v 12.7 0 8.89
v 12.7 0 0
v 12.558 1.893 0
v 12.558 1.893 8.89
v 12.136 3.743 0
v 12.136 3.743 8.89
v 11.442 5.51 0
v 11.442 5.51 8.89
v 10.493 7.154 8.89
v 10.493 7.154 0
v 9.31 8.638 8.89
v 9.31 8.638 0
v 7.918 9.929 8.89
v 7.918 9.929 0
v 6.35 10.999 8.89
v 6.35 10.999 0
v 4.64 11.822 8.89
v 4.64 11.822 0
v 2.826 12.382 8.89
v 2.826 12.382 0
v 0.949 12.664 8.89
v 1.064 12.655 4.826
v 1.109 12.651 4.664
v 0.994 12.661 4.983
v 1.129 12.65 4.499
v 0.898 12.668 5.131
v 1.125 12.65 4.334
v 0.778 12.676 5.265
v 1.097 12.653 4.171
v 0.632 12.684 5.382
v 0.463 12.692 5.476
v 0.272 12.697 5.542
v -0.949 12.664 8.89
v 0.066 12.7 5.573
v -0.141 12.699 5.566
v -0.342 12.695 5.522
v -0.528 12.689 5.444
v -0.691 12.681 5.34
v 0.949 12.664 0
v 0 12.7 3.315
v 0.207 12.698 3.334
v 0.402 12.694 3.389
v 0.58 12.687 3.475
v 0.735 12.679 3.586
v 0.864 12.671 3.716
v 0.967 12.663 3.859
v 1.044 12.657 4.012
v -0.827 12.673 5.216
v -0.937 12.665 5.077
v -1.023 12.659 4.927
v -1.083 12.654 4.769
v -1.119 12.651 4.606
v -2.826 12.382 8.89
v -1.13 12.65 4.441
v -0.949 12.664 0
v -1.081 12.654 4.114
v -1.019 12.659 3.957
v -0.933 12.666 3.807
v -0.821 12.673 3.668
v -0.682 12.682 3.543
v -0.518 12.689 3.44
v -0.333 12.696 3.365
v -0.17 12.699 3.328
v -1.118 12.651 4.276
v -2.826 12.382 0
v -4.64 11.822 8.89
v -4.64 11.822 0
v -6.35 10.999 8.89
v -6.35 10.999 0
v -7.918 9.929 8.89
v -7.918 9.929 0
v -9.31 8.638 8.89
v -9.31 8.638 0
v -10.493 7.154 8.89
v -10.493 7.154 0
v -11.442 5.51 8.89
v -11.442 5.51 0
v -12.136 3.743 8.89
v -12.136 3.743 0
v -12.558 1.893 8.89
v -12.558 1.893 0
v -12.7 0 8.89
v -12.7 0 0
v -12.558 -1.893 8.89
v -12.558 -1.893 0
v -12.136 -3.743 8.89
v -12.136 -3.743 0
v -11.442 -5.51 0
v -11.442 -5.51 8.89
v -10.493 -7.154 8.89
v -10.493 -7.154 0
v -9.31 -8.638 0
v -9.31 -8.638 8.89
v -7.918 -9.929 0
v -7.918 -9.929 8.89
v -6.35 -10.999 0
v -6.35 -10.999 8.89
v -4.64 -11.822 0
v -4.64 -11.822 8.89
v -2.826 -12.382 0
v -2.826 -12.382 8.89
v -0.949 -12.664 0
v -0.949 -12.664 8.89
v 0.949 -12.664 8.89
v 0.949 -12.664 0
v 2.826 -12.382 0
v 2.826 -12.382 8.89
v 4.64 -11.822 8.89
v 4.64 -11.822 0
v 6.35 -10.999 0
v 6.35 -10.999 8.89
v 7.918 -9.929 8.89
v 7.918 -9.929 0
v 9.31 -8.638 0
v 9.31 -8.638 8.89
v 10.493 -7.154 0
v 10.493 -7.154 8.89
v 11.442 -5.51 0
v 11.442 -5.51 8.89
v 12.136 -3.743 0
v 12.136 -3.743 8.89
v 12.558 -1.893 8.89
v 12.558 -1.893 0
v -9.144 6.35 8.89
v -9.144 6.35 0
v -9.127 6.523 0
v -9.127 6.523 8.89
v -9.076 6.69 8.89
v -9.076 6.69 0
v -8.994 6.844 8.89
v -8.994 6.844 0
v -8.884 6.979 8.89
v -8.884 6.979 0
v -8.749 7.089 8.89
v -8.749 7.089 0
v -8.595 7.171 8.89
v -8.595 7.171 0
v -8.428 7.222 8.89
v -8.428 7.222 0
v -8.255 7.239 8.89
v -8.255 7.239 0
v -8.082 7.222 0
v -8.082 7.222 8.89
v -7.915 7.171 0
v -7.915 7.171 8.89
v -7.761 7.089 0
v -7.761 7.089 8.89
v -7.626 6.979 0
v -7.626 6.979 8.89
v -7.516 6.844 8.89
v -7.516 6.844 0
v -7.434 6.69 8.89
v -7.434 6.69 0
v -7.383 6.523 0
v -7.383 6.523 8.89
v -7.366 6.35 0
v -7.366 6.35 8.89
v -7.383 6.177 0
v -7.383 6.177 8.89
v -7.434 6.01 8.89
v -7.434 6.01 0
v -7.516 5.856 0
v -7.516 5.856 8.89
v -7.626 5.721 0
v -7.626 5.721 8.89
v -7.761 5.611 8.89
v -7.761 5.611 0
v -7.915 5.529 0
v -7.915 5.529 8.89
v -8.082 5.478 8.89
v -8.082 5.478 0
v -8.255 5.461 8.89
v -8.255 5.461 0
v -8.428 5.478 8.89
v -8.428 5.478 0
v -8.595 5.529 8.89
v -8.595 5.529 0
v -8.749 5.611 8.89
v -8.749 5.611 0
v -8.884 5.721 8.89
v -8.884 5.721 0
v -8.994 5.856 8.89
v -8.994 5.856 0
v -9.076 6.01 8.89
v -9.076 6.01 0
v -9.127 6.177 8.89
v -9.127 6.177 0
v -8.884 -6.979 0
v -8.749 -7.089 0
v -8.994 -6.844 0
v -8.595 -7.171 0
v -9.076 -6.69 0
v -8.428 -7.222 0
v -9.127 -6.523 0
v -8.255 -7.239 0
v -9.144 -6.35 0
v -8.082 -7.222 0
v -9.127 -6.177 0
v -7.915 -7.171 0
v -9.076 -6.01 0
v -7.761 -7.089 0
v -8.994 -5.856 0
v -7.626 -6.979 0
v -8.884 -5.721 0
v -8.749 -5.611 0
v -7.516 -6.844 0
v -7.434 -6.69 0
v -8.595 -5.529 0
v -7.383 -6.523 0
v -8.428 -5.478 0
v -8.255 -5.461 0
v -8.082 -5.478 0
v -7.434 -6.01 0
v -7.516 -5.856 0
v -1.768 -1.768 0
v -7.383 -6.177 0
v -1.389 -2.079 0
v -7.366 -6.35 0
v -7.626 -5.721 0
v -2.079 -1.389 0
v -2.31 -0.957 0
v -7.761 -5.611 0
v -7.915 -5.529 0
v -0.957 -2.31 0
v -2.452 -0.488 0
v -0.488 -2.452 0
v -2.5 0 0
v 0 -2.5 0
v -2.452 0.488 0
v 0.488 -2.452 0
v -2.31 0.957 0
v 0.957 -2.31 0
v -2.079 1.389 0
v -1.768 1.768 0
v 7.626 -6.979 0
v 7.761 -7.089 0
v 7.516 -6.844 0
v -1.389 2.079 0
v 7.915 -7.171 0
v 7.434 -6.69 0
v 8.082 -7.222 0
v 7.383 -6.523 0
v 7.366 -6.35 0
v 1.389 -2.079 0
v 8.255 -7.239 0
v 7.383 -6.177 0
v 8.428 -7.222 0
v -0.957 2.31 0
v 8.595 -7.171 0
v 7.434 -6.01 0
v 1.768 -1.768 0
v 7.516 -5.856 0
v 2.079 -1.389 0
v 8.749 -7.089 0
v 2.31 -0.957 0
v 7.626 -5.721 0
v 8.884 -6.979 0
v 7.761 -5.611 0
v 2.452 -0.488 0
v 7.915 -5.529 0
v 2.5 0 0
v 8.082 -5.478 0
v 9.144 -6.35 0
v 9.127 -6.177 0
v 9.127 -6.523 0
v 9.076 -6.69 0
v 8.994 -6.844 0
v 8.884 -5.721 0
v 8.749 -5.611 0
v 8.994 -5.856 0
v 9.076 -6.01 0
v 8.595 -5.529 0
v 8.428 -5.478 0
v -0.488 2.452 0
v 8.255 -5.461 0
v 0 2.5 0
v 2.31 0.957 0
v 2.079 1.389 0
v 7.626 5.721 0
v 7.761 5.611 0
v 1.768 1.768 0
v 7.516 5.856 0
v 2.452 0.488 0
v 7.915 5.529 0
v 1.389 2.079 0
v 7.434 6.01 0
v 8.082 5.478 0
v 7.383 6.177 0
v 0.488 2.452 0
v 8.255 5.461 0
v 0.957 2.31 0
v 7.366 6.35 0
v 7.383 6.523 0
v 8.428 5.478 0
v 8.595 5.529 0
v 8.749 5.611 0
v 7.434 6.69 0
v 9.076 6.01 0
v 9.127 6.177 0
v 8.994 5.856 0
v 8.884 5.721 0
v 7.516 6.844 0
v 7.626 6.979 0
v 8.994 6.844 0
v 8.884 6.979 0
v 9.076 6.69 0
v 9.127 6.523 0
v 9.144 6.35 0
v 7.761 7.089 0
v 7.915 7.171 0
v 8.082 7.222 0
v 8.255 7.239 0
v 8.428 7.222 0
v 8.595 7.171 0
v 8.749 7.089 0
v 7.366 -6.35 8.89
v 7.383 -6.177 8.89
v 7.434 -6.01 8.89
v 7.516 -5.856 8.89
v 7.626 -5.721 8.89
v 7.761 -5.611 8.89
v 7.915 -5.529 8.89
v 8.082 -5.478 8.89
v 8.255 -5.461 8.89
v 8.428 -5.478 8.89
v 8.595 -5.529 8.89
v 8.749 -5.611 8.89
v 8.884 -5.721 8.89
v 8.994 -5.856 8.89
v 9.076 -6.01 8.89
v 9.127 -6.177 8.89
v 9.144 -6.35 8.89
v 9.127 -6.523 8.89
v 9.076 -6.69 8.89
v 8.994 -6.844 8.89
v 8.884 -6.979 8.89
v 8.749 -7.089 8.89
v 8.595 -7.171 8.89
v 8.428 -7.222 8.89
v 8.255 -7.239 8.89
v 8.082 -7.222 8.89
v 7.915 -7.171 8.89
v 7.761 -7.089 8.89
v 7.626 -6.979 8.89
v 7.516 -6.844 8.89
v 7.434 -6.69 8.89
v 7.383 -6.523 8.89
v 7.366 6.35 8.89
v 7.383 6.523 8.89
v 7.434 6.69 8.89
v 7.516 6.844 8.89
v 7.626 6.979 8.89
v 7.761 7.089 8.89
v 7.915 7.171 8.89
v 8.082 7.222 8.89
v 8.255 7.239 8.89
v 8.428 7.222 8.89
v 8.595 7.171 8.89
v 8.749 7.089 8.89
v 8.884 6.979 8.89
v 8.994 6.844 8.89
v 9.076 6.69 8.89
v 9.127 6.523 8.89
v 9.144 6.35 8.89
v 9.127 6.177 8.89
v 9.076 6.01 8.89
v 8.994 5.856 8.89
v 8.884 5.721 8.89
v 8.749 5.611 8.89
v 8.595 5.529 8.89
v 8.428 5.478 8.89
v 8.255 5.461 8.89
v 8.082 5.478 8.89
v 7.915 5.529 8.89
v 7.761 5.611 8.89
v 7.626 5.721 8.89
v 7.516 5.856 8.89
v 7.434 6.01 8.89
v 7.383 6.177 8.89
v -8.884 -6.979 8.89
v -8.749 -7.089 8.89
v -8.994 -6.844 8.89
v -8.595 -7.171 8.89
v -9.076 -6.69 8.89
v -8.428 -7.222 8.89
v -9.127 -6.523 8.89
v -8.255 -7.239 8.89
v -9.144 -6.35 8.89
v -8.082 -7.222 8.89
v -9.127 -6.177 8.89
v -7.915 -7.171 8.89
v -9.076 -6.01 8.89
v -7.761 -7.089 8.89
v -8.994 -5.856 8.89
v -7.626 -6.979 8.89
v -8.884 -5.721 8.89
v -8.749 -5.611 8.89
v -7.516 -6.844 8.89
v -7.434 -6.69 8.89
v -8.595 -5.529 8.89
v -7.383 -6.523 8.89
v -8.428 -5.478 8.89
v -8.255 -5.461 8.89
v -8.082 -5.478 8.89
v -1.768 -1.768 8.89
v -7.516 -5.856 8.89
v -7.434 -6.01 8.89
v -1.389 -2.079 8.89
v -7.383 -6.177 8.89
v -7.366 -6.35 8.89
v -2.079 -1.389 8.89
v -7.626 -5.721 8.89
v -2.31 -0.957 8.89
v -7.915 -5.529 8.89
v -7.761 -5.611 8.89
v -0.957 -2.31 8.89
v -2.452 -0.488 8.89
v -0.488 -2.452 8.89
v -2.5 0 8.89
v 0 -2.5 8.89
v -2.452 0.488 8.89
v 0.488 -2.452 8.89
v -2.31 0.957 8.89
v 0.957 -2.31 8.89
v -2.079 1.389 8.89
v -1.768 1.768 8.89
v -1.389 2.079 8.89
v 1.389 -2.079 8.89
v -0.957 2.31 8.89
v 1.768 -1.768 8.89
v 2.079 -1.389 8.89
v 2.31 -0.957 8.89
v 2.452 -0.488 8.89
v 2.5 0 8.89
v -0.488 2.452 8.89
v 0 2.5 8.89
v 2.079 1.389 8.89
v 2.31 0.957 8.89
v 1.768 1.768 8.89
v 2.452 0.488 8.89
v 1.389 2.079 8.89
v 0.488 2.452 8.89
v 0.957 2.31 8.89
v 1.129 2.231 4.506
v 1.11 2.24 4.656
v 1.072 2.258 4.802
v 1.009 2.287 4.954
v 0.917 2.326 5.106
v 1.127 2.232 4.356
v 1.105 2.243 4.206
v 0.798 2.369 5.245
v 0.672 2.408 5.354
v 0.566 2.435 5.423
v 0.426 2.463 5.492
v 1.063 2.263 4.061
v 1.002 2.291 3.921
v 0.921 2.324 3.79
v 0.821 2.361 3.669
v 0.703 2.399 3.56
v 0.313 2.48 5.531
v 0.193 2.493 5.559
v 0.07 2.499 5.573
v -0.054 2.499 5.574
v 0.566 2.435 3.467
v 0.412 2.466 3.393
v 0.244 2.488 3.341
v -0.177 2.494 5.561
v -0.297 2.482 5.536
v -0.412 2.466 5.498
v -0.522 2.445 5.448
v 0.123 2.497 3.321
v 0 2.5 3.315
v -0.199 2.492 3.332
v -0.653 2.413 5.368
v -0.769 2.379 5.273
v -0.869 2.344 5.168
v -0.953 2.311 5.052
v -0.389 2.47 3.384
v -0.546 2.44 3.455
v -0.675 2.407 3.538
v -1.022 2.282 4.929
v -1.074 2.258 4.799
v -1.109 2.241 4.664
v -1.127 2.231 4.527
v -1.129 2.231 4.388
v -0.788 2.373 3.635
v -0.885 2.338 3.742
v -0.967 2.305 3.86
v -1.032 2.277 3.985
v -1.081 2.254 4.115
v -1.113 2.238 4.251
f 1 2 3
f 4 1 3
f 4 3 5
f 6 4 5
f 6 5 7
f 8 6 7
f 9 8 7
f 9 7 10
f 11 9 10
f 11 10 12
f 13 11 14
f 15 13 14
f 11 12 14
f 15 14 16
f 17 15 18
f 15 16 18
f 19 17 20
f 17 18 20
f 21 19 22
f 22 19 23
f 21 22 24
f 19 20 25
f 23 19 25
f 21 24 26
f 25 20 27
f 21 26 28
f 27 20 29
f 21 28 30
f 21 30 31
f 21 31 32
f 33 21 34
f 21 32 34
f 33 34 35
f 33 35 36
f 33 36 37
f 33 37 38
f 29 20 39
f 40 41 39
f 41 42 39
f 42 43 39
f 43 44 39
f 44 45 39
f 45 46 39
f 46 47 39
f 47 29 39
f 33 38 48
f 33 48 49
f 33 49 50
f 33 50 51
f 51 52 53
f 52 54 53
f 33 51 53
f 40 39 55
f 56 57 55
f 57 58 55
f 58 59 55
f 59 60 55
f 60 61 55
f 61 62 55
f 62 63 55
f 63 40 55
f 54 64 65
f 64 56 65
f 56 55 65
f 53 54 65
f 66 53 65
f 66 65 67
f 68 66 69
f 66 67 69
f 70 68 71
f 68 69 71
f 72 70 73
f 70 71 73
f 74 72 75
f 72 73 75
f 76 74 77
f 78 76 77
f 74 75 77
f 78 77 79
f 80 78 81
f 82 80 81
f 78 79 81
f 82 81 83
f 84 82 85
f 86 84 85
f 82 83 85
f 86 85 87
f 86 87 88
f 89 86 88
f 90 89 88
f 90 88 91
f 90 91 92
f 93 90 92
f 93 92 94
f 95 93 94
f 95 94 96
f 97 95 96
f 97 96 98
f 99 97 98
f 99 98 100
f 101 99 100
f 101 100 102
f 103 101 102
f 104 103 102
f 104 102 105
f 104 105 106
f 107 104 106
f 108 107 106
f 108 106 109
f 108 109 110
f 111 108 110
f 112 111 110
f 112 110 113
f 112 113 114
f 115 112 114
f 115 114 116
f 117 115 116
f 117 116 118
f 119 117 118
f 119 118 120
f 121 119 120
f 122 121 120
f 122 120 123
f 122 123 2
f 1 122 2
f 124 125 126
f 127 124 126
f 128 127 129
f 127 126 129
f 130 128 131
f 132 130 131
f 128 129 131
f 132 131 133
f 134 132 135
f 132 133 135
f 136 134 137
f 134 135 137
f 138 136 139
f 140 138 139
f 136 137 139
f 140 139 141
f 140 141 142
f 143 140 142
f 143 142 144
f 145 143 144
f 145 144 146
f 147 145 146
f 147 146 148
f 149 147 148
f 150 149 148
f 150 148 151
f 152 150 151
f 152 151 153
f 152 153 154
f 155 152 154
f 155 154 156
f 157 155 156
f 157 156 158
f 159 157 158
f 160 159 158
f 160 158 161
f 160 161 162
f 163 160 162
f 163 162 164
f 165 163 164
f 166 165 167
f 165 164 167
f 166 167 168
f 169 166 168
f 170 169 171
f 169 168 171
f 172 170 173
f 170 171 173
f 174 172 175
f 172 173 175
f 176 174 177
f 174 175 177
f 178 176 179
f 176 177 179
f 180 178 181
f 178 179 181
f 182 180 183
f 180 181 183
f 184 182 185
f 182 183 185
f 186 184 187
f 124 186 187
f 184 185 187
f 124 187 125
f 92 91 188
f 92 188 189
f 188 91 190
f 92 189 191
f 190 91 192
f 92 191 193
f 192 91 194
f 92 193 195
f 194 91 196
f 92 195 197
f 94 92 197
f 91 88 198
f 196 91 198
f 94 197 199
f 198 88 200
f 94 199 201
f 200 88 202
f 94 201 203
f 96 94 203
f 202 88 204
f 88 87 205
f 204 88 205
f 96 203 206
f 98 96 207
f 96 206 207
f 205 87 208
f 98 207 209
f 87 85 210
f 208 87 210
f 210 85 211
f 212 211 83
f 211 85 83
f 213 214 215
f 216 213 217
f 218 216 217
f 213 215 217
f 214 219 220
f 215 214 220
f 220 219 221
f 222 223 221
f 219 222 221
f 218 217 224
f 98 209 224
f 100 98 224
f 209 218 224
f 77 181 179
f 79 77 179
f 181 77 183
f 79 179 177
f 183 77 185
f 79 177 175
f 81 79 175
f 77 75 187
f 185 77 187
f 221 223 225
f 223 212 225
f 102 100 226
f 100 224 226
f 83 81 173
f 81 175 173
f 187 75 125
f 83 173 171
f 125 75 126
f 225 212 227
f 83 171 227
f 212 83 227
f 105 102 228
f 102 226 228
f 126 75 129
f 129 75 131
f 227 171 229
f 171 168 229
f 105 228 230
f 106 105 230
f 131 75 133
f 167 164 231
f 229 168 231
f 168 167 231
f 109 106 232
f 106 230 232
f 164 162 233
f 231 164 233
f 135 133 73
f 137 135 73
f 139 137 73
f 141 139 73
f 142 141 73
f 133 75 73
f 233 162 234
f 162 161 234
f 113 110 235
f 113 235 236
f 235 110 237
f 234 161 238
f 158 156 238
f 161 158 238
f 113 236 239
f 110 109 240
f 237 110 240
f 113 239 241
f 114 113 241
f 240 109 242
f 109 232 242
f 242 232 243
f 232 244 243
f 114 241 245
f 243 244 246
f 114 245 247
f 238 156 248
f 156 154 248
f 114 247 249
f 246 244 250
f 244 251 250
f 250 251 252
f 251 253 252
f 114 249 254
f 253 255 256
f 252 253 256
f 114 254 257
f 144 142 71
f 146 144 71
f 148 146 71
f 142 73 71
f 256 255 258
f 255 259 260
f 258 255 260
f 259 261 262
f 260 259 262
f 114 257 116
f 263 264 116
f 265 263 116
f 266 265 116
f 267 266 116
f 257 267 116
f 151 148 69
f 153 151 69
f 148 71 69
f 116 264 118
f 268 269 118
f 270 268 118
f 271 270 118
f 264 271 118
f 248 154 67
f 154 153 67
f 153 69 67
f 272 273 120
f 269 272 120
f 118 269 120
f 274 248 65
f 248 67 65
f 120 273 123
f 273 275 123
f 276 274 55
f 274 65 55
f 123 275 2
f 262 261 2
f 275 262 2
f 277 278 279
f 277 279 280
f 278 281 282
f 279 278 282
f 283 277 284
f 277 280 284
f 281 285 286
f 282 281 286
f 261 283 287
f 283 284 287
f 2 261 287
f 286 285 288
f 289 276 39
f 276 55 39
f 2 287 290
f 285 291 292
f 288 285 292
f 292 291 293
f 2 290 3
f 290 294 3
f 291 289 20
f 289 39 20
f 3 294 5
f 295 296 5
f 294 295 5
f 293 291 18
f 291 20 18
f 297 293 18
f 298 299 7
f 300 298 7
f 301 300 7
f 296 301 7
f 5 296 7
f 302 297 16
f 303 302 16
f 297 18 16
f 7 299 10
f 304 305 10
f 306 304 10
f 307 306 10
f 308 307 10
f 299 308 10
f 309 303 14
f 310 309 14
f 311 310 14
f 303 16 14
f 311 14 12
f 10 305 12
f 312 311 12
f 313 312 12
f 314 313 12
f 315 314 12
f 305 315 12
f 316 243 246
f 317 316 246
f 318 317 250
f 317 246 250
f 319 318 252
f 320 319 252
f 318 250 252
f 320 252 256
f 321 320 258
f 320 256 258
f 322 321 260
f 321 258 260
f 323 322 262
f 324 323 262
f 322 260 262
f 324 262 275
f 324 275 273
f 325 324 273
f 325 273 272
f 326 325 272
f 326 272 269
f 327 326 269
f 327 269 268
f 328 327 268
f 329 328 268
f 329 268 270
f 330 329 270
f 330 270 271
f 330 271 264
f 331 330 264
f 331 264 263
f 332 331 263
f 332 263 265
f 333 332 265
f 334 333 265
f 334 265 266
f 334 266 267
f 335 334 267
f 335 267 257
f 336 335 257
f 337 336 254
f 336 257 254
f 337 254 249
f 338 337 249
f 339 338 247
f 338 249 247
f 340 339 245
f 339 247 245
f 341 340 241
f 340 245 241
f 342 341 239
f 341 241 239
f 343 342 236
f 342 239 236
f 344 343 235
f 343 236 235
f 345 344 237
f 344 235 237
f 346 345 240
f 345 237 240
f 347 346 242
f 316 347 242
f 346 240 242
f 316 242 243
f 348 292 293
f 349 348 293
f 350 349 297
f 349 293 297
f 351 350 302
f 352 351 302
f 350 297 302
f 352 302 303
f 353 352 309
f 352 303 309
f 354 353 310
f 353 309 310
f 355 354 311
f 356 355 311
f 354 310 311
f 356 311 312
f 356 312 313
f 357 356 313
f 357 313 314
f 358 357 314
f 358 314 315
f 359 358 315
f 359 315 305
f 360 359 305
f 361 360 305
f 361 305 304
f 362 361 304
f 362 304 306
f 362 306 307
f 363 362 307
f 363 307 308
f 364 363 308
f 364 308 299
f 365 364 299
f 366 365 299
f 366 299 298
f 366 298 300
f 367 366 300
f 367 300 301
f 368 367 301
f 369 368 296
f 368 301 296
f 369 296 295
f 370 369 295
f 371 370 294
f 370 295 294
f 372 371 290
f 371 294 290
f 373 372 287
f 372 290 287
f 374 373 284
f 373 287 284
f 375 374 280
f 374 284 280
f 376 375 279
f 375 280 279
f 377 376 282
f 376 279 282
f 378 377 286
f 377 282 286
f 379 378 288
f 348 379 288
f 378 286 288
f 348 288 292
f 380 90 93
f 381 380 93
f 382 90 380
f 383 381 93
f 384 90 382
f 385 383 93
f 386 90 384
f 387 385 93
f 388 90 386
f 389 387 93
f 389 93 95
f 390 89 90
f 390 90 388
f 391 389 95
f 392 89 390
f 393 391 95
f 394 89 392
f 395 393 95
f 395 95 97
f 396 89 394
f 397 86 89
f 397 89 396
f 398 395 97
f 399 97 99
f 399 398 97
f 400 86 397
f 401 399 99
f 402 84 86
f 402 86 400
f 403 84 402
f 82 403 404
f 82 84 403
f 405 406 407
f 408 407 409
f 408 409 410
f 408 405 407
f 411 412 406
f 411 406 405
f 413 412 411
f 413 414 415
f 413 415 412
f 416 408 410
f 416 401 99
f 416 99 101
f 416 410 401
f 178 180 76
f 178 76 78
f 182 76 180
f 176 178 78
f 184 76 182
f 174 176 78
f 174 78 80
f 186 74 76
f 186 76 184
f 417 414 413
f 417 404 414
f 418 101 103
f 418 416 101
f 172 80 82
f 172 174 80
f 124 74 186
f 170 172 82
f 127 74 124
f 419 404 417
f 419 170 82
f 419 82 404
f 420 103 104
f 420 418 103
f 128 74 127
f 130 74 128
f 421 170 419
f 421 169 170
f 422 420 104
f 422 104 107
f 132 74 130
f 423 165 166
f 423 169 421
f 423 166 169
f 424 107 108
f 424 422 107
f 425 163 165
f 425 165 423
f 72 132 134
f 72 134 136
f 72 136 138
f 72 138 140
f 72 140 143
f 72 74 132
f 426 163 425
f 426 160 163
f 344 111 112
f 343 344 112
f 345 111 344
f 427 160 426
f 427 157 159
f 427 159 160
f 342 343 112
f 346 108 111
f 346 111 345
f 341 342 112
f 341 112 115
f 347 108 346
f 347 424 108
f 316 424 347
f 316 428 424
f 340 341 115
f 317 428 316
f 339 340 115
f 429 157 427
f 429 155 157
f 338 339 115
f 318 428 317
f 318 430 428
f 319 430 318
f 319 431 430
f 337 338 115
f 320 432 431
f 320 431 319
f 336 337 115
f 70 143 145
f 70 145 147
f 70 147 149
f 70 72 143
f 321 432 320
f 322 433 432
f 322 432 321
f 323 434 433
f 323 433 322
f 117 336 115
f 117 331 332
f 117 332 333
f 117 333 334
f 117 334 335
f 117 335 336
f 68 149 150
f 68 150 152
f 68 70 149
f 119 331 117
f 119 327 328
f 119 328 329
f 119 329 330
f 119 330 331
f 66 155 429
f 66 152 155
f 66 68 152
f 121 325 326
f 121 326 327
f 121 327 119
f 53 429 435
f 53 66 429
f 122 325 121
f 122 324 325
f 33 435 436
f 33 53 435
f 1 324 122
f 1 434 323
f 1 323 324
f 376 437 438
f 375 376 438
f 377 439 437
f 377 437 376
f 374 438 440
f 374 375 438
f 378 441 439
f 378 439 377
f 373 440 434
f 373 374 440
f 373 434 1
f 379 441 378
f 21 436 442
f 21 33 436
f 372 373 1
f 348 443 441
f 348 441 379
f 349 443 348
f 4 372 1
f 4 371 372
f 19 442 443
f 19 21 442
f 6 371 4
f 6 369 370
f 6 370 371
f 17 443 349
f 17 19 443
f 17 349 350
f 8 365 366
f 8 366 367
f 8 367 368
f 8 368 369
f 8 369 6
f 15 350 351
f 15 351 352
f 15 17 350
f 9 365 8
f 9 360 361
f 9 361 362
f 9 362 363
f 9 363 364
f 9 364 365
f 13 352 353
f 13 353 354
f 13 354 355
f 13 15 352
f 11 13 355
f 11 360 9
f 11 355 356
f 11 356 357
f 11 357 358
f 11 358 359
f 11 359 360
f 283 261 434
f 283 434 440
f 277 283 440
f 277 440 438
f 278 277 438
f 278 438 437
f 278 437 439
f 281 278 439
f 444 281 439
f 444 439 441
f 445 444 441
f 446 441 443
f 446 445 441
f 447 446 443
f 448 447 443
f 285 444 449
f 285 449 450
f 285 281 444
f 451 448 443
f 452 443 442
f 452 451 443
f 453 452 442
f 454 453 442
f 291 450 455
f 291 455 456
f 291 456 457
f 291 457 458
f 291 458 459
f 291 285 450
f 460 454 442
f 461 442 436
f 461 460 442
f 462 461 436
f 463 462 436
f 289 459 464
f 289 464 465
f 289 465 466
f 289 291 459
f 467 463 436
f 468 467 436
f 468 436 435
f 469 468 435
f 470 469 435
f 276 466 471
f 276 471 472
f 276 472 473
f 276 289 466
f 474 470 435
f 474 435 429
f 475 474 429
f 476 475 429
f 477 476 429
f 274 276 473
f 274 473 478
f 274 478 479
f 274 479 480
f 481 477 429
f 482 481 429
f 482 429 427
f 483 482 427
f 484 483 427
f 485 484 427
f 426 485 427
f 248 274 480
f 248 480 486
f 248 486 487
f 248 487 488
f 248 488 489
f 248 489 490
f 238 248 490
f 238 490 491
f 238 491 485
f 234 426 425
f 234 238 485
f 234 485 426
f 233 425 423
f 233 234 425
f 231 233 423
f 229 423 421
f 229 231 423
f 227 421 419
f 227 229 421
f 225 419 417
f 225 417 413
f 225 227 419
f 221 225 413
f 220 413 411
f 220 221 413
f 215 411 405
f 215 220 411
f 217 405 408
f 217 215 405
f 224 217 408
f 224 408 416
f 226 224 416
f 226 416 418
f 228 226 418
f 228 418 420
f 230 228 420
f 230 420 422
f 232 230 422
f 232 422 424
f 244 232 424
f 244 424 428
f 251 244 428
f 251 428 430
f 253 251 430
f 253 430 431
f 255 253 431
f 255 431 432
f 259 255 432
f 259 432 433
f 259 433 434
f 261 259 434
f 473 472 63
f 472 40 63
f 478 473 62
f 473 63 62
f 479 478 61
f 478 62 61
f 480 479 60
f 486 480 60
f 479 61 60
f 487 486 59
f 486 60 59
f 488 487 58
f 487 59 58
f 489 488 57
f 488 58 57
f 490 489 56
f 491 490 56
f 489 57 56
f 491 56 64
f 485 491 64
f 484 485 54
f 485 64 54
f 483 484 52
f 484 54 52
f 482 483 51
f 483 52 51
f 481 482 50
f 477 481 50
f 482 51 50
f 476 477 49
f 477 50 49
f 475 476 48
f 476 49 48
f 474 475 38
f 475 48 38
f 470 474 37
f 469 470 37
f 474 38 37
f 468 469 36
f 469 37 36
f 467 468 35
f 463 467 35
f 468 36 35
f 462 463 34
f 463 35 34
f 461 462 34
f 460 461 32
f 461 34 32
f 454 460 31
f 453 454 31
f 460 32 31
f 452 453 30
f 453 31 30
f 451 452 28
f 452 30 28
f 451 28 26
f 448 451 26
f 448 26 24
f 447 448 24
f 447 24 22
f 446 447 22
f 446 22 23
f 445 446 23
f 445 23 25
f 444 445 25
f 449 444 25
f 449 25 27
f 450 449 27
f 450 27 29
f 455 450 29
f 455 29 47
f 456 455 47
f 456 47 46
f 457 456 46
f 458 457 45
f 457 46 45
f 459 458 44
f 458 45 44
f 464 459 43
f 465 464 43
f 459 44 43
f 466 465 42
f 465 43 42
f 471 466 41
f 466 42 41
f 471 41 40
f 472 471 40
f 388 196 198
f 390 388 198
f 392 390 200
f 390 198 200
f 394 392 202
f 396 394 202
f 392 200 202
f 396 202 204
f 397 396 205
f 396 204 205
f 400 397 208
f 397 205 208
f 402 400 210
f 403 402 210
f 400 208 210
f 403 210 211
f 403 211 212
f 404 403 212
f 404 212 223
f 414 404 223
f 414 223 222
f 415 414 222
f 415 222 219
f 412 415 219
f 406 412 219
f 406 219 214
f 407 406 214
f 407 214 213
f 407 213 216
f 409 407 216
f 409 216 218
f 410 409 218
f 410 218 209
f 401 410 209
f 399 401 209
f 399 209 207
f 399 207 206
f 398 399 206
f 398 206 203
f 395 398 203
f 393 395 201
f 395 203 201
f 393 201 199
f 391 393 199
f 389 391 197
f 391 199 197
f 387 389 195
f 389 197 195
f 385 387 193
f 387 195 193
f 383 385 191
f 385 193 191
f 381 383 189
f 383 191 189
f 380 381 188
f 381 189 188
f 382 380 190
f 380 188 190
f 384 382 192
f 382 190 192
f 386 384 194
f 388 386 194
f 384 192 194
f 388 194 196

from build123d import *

# Parameters (mm, degrees)
SKETCH1_R             = 12.7
SKETCH1_R_2           = 2.5
BOSS_EXTRUDE1_DEPTH   = 8.89
F_2_56_TAPPED_HOLE1_D = 1.778
SKETCH6_W             = 1.1303
SKETCH6_H             = 12.7


with BuildPart() as part:
    # Sketch1 → Boss-Extrude1 (new body)
    with BuildSketch(Plane.XY):
        Circle(SKETCH1_R)
        Circle(SKETCH1_R_2, mode=Mode.SUBTRACT)
    extrude(amount=BOSS_EXTRUDE1_DEPTH)

    # #2-56 Tapped Hole1 (through all)
    with Locations(Plane.XY.offset(8.89)):
        with Locations((-8.255, 6.35), (8.255, 6.35), (8.255, -6.35), (-8.255, -6.35)):
            Hole(F_2_56_TAPPED_HOLE1_D / 2)

    # Sketch6 → #4-40 Tapped Hole1 (revolve, cut)
    with BuildSketch(Plane(origin=(0, 0, 4.445), x_dir=(0, 0, -1), z_dir=(1, 0, 0))):
        with Locations((0.56515, 6.35)):
            Rectangle(SKETCH6_W, SKETCH6_H)
    revolve(axis=Axis((0, -6.35, 4.445), (0, 1, 0)), mode=Mode.SUBTRACT)


solid = part.part
